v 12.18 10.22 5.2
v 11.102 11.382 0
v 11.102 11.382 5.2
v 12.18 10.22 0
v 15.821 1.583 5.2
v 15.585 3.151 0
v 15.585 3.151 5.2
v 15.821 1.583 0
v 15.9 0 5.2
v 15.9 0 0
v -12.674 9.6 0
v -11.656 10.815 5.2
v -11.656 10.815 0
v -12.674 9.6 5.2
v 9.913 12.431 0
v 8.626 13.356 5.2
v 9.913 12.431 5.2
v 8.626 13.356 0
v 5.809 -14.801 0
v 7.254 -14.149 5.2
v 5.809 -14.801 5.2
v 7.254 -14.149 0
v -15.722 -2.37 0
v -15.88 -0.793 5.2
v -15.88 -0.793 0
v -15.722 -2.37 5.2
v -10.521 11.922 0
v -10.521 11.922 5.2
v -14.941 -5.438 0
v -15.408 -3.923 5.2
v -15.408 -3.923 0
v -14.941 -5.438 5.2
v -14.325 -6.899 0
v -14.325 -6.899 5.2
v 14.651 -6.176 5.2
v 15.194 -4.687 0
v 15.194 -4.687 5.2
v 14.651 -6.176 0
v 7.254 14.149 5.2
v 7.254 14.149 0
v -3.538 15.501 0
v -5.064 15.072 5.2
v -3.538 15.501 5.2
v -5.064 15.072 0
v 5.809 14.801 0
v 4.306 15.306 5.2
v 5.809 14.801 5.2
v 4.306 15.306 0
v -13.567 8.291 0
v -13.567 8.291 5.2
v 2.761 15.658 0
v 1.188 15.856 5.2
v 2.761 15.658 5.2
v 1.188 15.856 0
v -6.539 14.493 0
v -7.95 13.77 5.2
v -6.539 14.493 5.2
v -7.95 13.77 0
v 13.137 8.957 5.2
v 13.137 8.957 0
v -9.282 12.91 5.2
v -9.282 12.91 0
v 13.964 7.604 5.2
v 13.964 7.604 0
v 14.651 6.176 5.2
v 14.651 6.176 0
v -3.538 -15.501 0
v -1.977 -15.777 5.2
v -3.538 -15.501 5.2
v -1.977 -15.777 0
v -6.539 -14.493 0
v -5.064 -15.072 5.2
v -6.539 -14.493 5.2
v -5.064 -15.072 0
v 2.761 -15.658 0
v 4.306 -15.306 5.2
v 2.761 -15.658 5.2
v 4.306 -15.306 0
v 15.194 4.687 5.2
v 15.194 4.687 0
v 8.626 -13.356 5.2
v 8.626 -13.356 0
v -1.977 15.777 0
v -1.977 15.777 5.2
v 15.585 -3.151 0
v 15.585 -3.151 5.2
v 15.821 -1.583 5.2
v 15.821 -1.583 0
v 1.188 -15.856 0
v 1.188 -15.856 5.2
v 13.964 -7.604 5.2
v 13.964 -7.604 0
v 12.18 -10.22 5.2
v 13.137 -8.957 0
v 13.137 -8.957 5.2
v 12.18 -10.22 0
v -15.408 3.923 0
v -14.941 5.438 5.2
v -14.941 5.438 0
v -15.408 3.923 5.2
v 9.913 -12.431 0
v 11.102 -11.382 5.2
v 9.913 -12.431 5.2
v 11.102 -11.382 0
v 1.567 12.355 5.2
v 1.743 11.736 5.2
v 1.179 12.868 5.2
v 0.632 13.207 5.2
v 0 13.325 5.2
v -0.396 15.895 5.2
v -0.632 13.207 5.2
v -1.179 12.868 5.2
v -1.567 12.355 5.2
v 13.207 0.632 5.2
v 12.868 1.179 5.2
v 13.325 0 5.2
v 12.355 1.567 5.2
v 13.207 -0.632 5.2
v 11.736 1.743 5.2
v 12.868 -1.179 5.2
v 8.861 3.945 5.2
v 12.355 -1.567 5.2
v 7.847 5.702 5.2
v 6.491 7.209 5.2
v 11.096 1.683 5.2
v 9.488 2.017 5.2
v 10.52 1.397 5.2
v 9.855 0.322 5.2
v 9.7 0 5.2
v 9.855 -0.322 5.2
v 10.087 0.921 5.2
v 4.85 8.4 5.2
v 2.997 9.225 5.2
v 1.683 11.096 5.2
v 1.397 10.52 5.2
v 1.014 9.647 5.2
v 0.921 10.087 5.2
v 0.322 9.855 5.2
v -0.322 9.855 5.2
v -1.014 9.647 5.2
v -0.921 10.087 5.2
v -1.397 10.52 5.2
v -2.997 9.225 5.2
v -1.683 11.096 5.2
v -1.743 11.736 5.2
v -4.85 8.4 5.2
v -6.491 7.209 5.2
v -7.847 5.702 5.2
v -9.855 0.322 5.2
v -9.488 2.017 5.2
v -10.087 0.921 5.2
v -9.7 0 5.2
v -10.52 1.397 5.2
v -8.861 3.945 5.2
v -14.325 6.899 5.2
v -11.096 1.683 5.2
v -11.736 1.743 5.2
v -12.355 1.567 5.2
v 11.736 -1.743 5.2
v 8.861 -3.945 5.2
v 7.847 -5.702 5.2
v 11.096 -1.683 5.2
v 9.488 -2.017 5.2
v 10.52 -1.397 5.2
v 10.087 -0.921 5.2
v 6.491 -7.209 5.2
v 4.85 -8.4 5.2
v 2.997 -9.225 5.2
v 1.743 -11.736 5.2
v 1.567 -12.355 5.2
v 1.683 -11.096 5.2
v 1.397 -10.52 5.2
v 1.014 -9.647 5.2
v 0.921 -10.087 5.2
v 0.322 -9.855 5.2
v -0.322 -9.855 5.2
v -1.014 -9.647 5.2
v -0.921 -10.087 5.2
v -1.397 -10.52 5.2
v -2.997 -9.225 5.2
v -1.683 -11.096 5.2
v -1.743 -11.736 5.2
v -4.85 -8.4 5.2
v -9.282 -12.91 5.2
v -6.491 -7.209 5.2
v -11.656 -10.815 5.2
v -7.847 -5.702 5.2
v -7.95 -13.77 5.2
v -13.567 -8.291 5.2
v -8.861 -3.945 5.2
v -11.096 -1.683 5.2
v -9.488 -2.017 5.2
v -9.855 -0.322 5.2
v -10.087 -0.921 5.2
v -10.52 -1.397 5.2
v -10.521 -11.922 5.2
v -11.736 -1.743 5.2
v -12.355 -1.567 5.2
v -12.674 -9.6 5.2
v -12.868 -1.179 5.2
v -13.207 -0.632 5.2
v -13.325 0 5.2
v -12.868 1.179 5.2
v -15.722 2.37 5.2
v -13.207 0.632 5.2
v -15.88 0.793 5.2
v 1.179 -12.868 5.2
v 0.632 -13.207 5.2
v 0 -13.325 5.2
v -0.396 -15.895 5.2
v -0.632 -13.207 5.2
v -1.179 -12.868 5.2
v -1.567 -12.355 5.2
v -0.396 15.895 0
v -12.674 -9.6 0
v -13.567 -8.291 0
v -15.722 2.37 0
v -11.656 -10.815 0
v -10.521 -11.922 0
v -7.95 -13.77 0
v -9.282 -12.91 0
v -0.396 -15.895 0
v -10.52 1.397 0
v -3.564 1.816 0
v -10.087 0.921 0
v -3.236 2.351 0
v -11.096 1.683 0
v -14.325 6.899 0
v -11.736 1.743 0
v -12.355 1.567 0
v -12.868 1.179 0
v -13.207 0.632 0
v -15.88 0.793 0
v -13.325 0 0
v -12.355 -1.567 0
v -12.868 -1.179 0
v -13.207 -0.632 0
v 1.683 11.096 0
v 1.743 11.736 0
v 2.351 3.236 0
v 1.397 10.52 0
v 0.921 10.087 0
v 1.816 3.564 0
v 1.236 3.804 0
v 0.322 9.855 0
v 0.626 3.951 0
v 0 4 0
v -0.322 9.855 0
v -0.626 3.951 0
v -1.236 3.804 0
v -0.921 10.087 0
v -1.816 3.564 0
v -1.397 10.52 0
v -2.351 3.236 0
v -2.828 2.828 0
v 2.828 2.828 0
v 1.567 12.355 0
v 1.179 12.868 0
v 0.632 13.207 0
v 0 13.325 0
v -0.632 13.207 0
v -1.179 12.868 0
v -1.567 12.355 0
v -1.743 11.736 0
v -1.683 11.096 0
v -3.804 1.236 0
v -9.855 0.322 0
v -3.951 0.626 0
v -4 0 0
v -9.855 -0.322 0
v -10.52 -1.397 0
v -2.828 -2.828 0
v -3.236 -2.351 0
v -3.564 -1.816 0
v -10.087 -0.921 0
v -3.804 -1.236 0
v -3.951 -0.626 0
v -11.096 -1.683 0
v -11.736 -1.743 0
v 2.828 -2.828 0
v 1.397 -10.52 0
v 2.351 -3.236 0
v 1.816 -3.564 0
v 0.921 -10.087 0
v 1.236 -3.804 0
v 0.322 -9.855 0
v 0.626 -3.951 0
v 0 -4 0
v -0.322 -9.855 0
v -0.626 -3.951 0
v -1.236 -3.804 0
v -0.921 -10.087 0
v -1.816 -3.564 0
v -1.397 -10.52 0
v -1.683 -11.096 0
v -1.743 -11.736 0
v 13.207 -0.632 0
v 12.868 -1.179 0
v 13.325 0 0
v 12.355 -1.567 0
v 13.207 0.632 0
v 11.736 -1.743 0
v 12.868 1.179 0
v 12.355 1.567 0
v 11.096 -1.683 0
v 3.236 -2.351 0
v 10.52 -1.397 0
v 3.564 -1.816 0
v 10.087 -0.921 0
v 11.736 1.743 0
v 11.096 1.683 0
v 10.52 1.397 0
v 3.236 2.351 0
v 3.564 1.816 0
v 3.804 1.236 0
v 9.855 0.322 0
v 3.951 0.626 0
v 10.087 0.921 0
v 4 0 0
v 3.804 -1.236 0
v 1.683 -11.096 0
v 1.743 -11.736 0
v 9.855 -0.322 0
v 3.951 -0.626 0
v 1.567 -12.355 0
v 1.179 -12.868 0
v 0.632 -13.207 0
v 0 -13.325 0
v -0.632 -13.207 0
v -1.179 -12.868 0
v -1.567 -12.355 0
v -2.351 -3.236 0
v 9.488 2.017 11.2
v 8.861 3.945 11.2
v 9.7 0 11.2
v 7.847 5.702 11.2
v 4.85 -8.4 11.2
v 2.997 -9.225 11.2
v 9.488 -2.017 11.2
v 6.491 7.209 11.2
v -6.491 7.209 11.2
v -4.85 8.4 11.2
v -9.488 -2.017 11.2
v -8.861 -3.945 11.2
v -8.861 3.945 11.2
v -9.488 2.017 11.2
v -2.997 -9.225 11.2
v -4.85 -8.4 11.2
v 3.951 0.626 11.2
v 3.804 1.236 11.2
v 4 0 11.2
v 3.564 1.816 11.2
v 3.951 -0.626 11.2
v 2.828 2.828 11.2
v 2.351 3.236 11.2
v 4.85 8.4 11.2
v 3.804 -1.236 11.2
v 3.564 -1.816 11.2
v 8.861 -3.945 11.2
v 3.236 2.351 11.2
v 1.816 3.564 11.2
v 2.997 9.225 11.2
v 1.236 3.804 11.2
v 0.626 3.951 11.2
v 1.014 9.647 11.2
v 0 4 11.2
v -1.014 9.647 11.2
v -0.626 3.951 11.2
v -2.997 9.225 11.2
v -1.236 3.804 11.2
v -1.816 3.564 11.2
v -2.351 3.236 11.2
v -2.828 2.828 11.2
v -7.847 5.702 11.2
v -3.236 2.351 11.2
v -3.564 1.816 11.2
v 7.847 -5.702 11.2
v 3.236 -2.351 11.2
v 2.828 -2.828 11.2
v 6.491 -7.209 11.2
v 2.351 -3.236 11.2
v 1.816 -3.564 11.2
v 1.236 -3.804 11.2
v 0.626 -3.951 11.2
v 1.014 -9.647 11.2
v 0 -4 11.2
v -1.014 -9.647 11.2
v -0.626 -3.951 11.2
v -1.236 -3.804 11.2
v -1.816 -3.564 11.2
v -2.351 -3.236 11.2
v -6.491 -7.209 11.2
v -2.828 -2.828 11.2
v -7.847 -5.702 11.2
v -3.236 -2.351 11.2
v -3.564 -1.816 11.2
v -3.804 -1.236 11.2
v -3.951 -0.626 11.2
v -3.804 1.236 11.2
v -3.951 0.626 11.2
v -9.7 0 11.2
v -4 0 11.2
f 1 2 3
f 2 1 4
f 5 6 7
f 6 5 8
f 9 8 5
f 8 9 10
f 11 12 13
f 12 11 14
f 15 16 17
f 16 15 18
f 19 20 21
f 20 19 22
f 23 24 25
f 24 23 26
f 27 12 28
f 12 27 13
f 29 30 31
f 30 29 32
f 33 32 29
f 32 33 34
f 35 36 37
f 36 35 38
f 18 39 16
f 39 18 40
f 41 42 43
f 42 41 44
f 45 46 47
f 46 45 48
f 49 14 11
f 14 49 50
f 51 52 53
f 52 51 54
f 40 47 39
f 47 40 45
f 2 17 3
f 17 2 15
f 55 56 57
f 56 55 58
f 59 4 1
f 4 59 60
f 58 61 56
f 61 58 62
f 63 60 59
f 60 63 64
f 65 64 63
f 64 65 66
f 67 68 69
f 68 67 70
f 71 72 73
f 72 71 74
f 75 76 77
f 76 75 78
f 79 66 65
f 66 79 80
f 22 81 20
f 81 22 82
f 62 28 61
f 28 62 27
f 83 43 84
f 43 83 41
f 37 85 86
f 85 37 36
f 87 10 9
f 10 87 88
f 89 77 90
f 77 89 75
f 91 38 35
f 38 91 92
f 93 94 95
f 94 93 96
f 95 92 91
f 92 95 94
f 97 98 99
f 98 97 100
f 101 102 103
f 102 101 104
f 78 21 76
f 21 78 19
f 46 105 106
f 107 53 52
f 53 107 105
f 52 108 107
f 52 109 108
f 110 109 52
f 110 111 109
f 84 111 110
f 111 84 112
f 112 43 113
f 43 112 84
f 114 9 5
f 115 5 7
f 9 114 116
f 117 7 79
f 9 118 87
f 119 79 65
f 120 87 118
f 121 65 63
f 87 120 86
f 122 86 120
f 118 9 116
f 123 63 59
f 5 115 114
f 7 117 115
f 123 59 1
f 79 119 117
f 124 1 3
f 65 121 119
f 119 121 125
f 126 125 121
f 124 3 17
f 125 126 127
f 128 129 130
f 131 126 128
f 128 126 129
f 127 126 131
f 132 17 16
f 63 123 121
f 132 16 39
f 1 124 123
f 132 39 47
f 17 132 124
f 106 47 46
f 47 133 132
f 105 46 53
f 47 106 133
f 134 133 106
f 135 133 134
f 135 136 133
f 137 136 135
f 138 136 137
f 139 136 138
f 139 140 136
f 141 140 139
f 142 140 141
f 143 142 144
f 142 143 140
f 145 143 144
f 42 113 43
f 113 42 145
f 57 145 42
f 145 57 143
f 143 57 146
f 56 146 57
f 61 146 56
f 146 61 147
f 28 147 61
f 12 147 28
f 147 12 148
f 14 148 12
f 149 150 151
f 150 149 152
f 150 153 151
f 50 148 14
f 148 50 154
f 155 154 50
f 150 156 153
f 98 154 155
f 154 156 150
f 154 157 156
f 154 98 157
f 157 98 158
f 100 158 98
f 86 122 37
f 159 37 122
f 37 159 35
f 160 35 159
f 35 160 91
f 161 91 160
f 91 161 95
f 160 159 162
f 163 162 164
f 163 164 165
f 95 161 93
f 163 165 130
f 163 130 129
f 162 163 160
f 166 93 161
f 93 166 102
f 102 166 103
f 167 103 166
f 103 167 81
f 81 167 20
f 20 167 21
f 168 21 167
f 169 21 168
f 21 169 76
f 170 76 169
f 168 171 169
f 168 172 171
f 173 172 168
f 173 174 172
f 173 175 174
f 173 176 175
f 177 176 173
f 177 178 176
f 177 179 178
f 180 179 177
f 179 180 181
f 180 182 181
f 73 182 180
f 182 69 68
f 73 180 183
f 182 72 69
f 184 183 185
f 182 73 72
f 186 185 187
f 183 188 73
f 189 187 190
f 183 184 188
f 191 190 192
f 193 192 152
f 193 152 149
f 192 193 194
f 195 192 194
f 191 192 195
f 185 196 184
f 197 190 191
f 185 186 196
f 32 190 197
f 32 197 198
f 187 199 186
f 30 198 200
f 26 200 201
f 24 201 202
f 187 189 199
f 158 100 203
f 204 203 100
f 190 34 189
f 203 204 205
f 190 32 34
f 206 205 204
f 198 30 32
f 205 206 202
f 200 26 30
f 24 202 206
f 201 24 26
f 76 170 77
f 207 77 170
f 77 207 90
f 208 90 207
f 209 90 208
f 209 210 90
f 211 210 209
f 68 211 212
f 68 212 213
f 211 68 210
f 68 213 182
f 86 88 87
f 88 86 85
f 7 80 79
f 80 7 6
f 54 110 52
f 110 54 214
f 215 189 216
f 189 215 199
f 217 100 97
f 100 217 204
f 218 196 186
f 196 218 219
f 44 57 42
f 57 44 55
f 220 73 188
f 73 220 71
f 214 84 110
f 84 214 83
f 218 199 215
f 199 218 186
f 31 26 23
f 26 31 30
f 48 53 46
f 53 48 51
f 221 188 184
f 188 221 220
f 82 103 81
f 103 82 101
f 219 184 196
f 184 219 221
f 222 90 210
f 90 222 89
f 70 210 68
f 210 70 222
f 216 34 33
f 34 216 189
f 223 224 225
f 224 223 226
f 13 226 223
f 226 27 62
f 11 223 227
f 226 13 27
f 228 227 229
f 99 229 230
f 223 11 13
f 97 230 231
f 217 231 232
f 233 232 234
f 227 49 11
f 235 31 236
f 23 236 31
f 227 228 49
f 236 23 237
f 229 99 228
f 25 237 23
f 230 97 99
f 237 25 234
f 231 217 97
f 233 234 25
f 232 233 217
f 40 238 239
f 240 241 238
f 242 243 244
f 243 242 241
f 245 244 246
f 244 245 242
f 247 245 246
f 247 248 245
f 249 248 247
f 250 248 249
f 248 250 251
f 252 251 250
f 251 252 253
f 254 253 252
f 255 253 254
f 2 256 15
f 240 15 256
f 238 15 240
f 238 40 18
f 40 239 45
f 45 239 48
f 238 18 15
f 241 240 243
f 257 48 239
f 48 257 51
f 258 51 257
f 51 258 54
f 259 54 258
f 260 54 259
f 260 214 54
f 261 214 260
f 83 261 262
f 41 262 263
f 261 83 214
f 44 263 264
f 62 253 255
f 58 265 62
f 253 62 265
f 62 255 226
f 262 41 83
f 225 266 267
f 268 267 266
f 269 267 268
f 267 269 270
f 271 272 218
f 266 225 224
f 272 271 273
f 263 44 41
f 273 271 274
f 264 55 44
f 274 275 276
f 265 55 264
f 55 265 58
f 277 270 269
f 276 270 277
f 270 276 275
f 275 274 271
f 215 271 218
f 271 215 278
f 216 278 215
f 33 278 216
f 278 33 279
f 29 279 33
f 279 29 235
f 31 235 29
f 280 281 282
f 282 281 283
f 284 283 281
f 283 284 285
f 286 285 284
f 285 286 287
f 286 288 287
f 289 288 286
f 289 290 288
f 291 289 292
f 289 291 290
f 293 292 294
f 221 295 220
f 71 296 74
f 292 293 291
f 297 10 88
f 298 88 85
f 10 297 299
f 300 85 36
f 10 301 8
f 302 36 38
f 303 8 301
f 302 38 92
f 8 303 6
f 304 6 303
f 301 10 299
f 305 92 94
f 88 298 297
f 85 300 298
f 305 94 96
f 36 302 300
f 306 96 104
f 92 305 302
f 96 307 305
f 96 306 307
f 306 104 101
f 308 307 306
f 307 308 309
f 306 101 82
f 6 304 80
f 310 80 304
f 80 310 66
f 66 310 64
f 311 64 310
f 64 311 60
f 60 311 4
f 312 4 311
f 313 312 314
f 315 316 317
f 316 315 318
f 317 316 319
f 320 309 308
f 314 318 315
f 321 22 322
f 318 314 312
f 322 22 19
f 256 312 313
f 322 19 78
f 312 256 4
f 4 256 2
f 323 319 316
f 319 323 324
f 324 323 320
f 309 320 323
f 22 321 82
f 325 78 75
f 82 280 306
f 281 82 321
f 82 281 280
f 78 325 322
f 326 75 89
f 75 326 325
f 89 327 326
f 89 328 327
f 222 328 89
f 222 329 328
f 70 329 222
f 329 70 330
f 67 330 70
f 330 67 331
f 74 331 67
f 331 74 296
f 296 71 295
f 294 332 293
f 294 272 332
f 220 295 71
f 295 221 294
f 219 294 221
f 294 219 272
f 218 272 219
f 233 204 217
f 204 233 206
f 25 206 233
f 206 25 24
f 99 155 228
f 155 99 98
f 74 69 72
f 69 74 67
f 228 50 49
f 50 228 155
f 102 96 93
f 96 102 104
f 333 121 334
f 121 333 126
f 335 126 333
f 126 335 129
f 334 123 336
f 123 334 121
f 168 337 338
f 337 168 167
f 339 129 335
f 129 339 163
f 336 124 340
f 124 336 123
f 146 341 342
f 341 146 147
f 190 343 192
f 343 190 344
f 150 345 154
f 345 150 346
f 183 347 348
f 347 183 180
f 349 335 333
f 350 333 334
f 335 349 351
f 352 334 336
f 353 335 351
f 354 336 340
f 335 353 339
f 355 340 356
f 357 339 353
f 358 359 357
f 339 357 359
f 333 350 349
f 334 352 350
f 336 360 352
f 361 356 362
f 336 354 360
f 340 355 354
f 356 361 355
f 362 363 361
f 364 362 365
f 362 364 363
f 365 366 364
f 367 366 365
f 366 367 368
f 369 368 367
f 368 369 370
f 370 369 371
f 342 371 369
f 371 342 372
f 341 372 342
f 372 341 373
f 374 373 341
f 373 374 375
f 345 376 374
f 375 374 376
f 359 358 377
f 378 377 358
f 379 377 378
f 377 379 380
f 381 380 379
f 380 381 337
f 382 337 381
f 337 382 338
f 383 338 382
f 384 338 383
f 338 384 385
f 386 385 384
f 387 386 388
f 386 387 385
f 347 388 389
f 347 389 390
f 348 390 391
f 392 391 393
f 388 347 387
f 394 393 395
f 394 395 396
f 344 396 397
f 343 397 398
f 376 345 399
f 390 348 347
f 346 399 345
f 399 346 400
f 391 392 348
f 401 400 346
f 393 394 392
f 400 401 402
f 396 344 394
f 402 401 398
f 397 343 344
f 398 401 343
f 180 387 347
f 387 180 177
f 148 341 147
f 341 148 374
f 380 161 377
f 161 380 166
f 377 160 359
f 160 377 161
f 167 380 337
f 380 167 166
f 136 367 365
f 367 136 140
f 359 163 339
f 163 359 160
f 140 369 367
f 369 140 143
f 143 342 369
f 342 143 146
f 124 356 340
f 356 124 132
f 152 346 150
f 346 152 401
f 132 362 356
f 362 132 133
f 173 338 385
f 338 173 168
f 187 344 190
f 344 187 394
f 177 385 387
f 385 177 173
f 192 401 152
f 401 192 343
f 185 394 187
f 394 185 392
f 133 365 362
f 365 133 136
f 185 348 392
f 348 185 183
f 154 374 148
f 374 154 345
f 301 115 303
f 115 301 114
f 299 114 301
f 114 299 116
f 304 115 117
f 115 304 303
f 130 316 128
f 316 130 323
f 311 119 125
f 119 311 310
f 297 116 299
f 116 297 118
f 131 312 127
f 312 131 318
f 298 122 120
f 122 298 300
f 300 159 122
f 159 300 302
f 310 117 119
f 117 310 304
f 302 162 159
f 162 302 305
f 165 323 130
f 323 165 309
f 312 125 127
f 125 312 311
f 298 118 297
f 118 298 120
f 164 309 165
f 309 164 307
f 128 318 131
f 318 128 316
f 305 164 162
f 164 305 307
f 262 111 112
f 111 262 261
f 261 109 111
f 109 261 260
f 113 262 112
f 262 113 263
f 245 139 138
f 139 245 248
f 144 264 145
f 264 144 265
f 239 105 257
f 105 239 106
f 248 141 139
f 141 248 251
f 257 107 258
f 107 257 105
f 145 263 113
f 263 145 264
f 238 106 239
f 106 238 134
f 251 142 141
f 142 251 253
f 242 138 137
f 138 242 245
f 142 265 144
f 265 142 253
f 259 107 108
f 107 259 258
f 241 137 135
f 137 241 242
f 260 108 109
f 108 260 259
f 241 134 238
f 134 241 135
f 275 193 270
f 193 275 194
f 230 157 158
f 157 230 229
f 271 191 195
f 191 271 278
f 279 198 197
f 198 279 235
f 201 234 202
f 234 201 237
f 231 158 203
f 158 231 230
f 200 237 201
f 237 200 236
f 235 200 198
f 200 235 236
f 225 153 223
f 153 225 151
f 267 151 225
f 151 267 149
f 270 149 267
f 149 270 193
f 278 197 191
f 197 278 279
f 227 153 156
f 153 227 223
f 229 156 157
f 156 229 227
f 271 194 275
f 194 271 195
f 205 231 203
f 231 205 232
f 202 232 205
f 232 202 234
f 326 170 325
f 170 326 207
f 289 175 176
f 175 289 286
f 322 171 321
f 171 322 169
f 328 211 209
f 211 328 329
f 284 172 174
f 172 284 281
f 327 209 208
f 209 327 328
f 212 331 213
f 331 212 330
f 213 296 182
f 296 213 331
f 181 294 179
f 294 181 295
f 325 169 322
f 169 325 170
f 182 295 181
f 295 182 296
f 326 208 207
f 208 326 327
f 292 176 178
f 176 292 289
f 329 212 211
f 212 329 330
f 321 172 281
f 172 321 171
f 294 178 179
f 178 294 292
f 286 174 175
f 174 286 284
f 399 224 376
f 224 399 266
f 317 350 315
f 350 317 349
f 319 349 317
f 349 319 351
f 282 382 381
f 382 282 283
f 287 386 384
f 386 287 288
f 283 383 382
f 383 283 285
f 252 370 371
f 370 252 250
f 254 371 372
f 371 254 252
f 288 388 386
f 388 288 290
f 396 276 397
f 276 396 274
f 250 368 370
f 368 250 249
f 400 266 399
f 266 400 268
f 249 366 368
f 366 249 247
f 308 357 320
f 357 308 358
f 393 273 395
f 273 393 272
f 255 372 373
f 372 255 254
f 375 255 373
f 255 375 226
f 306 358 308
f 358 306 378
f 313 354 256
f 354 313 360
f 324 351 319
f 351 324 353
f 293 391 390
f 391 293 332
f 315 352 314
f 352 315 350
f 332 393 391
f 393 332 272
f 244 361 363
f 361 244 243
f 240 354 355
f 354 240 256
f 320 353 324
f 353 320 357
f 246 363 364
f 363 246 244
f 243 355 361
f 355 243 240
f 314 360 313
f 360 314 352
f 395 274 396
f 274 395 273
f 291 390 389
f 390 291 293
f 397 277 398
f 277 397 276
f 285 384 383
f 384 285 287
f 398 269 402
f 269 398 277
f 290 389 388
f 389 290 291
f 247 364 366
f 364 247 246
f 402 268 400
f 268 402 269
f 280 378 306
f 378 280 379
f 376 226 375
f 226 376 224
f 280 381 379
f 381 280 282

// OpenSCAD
top_r = 19.4 / 2;
top_h = 6;
base_r = 31.4 / 2 + 0.2;
base_h = 5.2;
hole_r = 3.5 / 2;
hole_mount_r = 23.15 / 2;
bore_r = 8 / 2;
hole_h = 50;

bearingMount();

module bearingMount(){
	difference(){
		union(){
			cylinder(r=base_r, h=base_h,$fn=base_r*4);
			translate([0,0,base_h])cylinder(r=top_r,h=top_h);
		}
		bearingMountHoles();
	}
}

module bearingMountHoles(){
	translate([0,0,-10]){
		for(i=[0:90:360]){
			rotate([0,0,i]){
				translate([hole_mount_r,0,0])cylinder(r=hole_r,h=hole_h, $fn=hole_r * 10);
			}
		}
		cylinder(r=bore_r, h=hole_h, $fn=bore_r * 10);
	}
}
